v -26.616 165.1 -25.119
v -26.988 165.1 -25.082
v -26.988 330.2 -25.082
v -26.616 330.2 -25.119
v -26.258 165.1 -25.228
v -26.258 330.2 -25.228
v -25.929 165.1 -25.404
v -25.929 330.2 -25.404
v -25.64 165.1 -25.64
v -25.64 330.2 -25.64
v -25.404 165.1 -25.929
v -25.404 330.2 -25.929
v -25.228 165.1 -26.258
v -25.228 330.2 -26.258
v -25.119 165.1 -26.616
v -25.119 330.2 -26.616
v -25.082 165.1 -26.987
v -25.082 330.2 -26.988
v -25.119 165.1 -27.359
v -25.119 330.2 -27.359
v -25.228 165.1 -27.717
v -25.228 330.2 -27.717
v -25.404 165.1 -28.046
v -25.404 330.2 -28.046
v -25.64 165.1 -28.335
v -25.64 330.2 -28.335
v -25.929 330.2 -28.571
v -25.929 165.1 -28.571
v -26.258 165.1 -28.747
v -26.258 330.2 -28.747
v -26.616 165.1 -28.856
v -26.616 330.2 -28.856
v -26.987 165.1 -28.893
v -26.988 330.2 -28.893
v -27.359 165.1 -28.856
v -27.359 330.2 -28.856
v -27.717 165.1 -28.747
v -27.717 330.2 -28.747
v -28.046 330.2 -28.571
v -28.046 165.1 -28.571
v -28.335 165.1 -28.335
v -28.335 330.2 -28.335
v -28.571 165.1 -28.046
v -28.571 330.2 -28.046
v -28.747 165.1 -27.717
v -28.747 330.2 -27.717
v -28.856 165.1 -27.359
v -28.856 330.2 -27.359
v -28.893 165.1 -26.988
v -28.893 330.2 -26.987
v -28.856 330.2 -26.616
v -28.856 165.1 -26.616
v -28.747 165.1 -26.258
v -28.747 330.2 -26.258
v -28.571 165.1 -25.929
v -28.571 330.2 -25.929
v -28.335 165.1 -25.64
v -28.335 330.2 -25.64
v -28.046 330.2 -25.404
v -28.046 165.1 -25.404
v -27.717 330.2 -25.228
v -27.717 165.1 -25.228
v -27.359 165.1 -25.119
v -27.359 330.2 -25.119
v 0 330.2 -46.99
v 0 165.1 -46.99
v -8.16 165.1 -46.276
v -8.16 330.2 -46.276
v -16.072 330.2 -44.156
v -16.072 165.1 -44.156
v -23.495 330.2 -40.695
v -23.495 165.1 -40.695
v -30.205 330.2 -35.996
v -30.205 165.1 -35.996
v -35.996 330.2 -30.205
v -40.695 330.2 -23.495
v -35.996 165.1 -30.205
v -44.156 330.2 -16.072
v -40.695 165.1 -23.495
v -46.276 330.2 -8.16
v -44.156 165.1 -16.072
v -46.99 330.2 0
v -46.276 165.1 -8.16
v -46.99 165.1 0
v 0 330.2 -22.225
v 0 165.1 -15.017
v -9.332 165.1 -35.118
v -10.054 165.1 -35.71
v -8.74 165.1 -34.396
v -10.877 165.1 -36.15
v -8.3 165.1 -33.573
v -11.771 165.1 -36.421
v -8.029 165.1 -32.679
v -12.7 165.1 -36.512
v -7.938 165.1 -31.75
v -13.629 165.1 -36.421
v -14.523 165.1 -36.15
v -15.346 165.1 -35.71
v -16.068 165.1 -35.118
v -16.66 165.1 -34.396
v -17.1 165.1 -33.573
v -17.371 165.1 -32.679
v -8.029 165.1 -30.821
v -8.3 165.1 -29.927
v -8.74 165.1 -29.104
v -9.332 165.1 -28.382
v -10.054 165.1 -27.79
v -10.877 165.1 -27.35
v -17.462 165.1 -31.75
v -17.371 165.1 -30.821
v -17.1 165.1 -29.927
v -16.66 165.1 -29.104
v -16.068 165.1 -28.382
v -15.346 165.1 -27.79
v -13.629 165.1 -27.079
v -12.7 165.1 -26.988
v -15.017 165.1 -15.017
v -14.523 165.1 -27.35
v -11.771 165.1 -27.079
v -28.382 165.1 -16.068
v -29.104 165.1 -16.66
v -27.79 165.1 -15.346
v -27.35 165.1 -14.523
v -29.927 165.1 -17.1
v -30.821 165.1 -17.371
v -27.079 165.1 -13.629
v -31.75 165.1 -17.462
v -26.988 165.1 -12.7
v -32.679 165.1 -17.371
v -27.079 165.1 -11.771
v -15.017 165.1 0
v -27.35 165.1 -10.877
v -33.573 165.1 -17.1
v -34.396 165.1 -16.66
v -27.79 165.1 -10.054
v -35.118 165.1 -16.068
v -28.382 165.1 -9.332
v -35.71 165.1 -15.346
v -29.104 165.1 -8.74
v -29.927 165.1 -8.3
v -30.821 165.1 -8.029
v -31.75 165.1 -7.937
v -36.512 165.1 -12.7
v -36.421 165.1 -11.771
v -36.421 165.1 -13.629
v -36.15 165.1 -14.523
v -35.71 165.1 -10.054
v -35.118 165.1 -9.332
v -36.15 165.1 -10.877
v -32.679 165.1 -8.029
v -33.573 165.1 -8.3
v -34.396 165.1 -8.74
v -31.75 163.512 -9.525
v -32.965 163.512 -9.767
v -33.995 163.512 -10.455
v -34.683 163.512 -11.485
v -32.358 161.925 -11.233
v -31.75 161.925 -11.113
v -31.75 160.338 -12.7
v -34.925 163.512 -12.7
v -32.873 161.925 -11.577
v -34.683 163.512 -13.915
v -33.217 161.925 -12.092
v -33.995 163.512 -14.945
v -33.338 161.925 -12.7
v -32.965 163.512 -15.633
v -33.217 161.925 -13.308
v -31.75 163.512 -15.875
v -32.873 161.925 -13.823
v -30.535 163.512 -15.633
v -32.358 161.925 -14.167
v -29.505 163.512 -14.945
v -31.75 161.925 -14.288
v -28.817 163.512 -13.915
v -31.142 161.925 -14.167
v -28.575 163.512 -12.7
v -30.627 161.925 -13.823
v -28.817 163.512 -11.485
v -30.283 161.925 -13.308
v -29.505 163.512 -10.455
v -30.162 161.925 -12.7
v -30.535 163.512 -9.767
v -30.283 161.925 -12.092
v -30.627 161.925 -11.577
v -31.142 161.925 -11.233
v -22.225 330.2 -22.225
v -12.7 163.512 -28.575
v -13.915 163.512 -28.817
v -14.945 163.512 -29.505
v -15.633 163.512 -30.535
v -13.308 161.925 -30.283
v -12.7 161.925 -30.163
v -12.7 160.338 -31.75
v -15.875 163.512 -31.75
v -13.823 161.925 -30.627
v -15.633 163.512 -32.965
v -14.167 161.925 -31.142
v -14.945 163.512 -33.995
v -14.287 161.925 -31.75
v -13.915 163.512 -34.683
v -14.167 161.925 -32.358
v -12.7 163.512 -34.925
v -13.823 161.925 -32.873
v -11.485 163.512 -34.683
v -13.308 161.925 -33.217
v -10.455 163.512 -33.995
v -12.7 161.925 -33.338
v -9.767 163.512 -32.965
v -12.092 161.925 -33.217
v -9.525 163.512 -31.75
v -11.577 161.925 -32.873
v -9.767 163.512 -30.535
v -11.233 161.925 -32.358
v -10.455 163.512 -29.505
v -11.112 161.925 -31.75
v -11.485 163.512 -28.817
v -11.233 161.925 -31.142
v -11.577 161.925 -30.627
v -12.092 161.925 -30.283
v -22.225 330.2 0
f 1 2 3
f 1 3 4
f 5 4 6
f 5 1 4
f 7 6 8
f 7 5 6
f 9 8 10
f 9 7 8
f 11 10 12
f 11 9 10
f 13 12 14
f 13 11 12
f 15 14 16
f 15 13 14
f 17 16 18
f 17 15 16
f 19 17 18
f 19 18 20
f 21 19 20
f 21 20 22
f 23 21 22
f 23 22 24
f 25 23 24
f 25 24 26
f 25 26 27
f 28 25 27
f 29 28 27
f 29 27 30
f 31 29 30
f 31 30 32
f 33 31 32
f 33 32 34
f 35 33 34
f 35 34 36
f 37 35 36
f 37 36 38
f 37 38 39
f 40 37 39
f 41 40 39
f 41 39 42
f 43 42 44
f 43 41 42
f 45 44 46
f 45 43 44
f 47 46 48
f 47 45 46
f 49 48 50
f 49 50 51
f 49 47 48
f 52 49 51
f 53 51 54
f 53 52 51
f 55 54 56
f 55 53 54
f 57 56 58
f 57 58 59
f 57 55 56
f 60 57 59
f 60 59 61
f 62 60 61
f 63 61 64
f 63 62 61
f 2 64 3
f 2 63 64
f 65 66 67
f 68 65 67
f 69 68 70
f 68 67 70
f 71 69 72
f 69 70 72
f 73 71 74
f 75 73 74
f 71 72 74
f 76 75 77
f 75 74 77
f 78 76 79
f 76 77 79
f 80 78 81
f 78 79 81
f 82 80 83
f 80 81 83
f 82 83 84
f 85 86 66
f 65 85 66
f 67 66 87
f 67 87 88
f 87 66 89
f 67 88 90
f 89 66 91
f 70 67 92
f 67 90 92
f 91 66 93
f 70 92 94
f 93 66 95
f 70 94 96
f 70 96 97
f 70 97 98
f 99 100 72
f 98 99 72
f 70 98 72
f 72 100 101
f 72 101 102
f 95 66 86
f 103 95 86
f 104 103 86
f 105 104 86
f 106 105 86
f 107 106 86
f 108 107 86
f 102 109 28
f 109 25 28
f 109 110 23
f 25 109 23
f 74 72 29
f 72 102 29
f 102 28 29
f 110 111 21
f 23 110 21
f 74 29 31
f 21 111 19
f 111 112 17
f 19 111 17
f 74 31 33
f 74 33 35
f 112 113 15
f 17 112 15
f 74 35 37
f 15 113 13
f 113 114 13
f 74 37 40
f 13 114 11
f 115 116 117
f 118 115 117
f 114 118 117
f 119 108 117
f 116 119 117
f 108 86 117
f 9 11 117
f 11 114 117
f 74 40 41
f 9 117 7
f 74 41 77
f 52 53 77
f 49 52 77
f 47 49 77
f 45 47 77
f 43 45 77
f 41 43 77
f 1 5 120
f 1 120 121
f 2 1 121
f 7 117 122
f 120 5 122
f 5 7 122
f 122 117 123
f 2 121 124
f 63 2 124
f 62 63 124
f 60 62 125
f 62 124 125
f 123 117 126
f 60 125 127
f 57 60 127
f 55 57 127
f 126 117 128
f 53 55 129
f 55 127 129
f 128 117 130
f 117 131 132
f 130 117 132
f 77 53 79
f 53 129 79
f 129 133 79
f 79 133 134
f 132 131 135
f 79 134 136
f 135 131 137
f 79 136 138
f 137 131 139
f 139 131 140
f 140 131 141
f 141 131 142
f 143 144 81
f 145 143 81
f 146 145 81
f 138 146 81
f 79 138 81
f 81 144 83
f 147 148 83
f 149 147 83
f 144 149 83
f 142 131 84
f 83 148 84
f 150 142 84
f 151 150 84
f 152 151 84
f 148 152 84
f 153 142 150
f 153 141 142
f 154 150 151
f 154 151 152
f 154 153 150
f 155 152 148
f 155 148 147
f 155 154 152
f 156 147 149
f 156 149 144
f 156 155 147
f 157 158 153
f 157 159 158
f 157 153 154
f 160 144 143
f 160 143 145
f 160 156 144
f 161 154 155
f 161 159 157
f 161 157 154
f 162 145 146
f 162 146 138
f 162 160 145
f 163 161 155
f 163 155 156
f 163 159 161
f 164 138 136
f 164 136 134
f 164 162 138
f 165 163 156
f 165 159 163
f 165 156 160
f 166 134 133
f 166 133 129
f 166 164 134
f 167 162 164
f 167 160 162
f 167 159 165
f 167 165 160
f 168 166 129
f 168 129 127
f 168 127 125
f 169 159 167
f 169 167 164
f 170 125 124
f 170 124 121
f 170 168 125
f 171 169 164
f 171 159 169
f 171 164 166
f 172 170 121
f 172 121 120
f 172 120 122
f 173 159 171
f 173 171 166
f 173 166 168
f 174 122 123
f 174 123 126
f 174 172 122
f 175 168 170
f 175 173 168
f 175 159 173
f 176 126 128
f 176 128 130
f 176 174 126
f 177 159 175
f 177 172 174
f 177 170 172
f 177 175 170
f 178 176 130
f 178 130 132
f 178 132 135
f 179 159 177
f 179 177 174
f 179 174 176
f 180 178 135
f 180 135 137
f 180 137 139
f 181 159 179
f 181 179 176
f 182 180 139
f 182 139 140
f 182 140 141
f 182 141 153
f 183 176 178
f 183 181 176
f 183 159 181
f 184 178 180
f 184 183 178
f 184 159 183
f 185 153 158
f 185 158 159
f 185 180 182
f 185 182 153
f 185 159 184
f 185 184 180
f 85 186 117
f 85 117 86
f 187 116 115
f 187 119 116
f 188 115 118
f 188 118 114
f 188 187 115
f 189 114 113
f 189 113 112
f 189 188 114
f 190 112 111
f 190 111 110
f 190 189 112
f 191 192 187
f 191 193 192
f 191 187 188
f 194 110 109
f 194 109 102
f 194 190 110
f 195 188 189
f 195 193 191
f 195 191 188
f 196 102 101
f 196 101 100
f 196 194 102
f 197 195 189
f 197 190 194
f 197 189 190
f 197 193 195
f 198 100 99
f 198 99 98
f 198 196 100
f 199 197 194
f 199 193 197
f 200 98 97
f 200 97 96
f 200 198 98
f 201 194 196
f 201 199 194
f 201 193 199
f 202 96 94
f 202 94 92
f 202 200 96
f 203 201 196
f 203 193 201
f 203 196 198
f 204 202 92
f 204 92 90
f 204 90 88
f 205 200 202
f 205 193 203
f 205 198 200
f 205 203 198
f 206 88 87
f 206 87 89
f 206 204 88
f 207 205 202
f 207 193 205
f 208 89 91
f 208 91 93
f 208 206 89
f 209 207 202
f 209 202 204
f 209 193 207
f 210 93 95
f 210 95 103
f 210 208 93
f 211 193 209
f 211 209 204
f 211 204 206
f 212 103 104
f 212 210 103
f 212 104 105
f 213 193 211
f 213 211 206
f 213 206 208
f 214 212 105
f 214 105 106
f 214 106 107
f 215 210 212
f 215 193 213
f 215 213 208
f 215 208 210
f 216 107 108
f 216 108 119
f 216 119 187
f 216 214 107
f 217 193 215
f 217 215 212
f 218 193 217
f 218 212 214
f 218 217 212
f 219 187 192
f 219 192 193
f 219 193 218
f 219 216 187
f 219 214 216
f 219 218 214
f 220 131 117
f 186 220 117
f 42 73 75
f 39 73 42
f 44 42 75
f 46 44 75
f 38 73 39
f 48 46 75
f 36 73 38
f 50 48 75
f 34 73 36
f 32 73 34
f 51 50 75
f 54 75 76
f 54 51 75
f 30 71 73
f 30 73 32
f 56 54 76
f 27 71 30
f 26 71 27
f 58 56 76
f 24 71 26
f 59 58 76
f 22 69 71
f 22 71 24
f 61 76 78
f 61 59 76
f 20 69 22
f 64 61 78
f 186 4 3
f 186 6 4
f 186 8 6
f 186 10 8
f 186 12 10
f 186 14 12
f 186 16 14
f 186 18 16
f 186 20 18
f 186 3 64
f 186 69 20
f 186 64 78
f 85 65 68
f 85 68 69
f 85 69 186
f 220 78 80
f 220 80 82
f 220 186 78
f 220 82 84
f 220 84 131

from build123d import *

# Parameters (mm, degrees)
SKETCH1_R           = 46.99
BOSS_EXTRUDE1_DEPTH = 330.2
SKETCH2_W           = 44.45
SKETCH2_H           = 44.45
CUT_EXTRUDE1_DEPTH  = 330.2
CUT_EXTRUDE1_DRAFT  = -2.5
CUT_EXTRUDE2_START  = -330.2
SKETCH3_R           = 1.905
CUT_EXTRUDE2_DEPTH  = 330.2
CUT_EXTRUDE3_DEPTH  = 165.1


with BuildPart() as part:
    # Sketch1 → Boss-Extrude1 (new body)
    with BuildSketch(Plane(origin=(0, 0, 0), x_dir=(1, 0, 0), z_dir=(0, 1, 0))):
        with Locations(Location((0, 0, 0), (0, 0, 270))):
            Circle(SKETCH1_R)
    extrude(amount=BOSS_EXTRUDE1_DEPTH)


with BuildPart() as cut_extrude1_tool:
    # Sketch2 → Cut-Extrude1 (with draft: the straight prism first)
    with BuildSketch(Plane(origin=(0, 330.2, 0), x_dir=(1, 0, 0), z_dir=(0, 1, 0))):
        Rectangle(SKETCH2_W, SKETCH2_H)
    extrude(amount=-CUT_EXTRUDE1_DEPTH)
    # Cut-Extrude1: the draft: its side faces are tilted about the plane it starts from
    cut_extrude1_sides = [cut_extrude1_tool.faces().sort_by_distance(p)[0] for p in [
        (-22.225, 165.1, 0),
        (0, 165.1, 22.225),
        (22.225, 165.1, 0),
        (0, 165.1, -22.225),
    ]]
    draft(cut_extrude1_sides, Plane(origin=(0, 330.2, 0), x_dir=(1, 0, 0), z_dir=(0, 1, 0)), CUT_EXTRUDE1_DRAFT)


with BuildPart() as part_1:
    add(part.part)

    # Cut-Extrude1: cut by cut_extrude1_tool
    add(cut_extrude1_tool.part, mode=Mode.SUBTRACT)

    # Sketch3 → Cut-Extrude2 (cut)
    with BuildSketch(Plane(origin=(0, 330.2, 0), x_dir=(1, 0, 0), z_dir=(0, 1, 0)).offset(CUT_EXTRUDE2_START)):
        with Locations(Location((-26.9875, 26.9875, 0), (0, 0, 270))):
            Circle(SKETCH3_R)
        with BuildLine():
            Line((0, 12.7), (0, 46.99))
            ThreePointArc((0, 46.99), (33.226947648, -33.226947648), (-46.99, 0))
            Line((-46.99, 0), (-12.7, 0))
            Line((-12.7, 0), (0, 0))
            Line((0, 0), (0, 12.7))
        make_face()
    extrude(amount=CUT_EXTRUDE2_DEPTH, mode=Mode.SUBTRACT)

    # Sketch5 → Cut-Extrude3 (cut)
    with BuildSketch(Plane.XZ):
        with BuildLine():
            Line((-46.99, 0), (0, 0))
            Line((0, 0), (0, -46.99))
            ThreePointArc((0, -46.99), (-33.226947648, -33.226947648), (-46.99, 0))
        make_face()
    extrude(amount=-CUT_EXTRUDE3_DEPTH, mode=Mode.SUBTRACT)

    # Boss-Extrude3 cone 1 section (through the dimple's axis) → Boss-Extrude3 (revolve)
    with BuildSketch(Plane(origin=(-31.75, 165.1, -12.7), x_dir=(0, 0, 1), z_dir=(1, 0, 0))):
        Polygon((0, 0), (4.7625, 0), (0, 4.7625), align=None)
    revolve(axis=Axis((-31.75, 165.1, -12.7), (0, -1, 0)))

    # Boss-Extrude3 cone 2 section (through the dimple's axis) → Boss-Extrude3 cone 2 (revolve)
    with BuildSketch(Plane(origin=(-12.7, 165.1, -31.75), x_dir=(0, 0, 1), z_dir=(1, 0, 0))):
        Polygon((0, 0), (4.7625, 0), (0, 4.7625), align=None)
    revolve(axis=Axis((-12.7, 165.1, -31.75), (0, -1, 0)))


solid = part_1.part
